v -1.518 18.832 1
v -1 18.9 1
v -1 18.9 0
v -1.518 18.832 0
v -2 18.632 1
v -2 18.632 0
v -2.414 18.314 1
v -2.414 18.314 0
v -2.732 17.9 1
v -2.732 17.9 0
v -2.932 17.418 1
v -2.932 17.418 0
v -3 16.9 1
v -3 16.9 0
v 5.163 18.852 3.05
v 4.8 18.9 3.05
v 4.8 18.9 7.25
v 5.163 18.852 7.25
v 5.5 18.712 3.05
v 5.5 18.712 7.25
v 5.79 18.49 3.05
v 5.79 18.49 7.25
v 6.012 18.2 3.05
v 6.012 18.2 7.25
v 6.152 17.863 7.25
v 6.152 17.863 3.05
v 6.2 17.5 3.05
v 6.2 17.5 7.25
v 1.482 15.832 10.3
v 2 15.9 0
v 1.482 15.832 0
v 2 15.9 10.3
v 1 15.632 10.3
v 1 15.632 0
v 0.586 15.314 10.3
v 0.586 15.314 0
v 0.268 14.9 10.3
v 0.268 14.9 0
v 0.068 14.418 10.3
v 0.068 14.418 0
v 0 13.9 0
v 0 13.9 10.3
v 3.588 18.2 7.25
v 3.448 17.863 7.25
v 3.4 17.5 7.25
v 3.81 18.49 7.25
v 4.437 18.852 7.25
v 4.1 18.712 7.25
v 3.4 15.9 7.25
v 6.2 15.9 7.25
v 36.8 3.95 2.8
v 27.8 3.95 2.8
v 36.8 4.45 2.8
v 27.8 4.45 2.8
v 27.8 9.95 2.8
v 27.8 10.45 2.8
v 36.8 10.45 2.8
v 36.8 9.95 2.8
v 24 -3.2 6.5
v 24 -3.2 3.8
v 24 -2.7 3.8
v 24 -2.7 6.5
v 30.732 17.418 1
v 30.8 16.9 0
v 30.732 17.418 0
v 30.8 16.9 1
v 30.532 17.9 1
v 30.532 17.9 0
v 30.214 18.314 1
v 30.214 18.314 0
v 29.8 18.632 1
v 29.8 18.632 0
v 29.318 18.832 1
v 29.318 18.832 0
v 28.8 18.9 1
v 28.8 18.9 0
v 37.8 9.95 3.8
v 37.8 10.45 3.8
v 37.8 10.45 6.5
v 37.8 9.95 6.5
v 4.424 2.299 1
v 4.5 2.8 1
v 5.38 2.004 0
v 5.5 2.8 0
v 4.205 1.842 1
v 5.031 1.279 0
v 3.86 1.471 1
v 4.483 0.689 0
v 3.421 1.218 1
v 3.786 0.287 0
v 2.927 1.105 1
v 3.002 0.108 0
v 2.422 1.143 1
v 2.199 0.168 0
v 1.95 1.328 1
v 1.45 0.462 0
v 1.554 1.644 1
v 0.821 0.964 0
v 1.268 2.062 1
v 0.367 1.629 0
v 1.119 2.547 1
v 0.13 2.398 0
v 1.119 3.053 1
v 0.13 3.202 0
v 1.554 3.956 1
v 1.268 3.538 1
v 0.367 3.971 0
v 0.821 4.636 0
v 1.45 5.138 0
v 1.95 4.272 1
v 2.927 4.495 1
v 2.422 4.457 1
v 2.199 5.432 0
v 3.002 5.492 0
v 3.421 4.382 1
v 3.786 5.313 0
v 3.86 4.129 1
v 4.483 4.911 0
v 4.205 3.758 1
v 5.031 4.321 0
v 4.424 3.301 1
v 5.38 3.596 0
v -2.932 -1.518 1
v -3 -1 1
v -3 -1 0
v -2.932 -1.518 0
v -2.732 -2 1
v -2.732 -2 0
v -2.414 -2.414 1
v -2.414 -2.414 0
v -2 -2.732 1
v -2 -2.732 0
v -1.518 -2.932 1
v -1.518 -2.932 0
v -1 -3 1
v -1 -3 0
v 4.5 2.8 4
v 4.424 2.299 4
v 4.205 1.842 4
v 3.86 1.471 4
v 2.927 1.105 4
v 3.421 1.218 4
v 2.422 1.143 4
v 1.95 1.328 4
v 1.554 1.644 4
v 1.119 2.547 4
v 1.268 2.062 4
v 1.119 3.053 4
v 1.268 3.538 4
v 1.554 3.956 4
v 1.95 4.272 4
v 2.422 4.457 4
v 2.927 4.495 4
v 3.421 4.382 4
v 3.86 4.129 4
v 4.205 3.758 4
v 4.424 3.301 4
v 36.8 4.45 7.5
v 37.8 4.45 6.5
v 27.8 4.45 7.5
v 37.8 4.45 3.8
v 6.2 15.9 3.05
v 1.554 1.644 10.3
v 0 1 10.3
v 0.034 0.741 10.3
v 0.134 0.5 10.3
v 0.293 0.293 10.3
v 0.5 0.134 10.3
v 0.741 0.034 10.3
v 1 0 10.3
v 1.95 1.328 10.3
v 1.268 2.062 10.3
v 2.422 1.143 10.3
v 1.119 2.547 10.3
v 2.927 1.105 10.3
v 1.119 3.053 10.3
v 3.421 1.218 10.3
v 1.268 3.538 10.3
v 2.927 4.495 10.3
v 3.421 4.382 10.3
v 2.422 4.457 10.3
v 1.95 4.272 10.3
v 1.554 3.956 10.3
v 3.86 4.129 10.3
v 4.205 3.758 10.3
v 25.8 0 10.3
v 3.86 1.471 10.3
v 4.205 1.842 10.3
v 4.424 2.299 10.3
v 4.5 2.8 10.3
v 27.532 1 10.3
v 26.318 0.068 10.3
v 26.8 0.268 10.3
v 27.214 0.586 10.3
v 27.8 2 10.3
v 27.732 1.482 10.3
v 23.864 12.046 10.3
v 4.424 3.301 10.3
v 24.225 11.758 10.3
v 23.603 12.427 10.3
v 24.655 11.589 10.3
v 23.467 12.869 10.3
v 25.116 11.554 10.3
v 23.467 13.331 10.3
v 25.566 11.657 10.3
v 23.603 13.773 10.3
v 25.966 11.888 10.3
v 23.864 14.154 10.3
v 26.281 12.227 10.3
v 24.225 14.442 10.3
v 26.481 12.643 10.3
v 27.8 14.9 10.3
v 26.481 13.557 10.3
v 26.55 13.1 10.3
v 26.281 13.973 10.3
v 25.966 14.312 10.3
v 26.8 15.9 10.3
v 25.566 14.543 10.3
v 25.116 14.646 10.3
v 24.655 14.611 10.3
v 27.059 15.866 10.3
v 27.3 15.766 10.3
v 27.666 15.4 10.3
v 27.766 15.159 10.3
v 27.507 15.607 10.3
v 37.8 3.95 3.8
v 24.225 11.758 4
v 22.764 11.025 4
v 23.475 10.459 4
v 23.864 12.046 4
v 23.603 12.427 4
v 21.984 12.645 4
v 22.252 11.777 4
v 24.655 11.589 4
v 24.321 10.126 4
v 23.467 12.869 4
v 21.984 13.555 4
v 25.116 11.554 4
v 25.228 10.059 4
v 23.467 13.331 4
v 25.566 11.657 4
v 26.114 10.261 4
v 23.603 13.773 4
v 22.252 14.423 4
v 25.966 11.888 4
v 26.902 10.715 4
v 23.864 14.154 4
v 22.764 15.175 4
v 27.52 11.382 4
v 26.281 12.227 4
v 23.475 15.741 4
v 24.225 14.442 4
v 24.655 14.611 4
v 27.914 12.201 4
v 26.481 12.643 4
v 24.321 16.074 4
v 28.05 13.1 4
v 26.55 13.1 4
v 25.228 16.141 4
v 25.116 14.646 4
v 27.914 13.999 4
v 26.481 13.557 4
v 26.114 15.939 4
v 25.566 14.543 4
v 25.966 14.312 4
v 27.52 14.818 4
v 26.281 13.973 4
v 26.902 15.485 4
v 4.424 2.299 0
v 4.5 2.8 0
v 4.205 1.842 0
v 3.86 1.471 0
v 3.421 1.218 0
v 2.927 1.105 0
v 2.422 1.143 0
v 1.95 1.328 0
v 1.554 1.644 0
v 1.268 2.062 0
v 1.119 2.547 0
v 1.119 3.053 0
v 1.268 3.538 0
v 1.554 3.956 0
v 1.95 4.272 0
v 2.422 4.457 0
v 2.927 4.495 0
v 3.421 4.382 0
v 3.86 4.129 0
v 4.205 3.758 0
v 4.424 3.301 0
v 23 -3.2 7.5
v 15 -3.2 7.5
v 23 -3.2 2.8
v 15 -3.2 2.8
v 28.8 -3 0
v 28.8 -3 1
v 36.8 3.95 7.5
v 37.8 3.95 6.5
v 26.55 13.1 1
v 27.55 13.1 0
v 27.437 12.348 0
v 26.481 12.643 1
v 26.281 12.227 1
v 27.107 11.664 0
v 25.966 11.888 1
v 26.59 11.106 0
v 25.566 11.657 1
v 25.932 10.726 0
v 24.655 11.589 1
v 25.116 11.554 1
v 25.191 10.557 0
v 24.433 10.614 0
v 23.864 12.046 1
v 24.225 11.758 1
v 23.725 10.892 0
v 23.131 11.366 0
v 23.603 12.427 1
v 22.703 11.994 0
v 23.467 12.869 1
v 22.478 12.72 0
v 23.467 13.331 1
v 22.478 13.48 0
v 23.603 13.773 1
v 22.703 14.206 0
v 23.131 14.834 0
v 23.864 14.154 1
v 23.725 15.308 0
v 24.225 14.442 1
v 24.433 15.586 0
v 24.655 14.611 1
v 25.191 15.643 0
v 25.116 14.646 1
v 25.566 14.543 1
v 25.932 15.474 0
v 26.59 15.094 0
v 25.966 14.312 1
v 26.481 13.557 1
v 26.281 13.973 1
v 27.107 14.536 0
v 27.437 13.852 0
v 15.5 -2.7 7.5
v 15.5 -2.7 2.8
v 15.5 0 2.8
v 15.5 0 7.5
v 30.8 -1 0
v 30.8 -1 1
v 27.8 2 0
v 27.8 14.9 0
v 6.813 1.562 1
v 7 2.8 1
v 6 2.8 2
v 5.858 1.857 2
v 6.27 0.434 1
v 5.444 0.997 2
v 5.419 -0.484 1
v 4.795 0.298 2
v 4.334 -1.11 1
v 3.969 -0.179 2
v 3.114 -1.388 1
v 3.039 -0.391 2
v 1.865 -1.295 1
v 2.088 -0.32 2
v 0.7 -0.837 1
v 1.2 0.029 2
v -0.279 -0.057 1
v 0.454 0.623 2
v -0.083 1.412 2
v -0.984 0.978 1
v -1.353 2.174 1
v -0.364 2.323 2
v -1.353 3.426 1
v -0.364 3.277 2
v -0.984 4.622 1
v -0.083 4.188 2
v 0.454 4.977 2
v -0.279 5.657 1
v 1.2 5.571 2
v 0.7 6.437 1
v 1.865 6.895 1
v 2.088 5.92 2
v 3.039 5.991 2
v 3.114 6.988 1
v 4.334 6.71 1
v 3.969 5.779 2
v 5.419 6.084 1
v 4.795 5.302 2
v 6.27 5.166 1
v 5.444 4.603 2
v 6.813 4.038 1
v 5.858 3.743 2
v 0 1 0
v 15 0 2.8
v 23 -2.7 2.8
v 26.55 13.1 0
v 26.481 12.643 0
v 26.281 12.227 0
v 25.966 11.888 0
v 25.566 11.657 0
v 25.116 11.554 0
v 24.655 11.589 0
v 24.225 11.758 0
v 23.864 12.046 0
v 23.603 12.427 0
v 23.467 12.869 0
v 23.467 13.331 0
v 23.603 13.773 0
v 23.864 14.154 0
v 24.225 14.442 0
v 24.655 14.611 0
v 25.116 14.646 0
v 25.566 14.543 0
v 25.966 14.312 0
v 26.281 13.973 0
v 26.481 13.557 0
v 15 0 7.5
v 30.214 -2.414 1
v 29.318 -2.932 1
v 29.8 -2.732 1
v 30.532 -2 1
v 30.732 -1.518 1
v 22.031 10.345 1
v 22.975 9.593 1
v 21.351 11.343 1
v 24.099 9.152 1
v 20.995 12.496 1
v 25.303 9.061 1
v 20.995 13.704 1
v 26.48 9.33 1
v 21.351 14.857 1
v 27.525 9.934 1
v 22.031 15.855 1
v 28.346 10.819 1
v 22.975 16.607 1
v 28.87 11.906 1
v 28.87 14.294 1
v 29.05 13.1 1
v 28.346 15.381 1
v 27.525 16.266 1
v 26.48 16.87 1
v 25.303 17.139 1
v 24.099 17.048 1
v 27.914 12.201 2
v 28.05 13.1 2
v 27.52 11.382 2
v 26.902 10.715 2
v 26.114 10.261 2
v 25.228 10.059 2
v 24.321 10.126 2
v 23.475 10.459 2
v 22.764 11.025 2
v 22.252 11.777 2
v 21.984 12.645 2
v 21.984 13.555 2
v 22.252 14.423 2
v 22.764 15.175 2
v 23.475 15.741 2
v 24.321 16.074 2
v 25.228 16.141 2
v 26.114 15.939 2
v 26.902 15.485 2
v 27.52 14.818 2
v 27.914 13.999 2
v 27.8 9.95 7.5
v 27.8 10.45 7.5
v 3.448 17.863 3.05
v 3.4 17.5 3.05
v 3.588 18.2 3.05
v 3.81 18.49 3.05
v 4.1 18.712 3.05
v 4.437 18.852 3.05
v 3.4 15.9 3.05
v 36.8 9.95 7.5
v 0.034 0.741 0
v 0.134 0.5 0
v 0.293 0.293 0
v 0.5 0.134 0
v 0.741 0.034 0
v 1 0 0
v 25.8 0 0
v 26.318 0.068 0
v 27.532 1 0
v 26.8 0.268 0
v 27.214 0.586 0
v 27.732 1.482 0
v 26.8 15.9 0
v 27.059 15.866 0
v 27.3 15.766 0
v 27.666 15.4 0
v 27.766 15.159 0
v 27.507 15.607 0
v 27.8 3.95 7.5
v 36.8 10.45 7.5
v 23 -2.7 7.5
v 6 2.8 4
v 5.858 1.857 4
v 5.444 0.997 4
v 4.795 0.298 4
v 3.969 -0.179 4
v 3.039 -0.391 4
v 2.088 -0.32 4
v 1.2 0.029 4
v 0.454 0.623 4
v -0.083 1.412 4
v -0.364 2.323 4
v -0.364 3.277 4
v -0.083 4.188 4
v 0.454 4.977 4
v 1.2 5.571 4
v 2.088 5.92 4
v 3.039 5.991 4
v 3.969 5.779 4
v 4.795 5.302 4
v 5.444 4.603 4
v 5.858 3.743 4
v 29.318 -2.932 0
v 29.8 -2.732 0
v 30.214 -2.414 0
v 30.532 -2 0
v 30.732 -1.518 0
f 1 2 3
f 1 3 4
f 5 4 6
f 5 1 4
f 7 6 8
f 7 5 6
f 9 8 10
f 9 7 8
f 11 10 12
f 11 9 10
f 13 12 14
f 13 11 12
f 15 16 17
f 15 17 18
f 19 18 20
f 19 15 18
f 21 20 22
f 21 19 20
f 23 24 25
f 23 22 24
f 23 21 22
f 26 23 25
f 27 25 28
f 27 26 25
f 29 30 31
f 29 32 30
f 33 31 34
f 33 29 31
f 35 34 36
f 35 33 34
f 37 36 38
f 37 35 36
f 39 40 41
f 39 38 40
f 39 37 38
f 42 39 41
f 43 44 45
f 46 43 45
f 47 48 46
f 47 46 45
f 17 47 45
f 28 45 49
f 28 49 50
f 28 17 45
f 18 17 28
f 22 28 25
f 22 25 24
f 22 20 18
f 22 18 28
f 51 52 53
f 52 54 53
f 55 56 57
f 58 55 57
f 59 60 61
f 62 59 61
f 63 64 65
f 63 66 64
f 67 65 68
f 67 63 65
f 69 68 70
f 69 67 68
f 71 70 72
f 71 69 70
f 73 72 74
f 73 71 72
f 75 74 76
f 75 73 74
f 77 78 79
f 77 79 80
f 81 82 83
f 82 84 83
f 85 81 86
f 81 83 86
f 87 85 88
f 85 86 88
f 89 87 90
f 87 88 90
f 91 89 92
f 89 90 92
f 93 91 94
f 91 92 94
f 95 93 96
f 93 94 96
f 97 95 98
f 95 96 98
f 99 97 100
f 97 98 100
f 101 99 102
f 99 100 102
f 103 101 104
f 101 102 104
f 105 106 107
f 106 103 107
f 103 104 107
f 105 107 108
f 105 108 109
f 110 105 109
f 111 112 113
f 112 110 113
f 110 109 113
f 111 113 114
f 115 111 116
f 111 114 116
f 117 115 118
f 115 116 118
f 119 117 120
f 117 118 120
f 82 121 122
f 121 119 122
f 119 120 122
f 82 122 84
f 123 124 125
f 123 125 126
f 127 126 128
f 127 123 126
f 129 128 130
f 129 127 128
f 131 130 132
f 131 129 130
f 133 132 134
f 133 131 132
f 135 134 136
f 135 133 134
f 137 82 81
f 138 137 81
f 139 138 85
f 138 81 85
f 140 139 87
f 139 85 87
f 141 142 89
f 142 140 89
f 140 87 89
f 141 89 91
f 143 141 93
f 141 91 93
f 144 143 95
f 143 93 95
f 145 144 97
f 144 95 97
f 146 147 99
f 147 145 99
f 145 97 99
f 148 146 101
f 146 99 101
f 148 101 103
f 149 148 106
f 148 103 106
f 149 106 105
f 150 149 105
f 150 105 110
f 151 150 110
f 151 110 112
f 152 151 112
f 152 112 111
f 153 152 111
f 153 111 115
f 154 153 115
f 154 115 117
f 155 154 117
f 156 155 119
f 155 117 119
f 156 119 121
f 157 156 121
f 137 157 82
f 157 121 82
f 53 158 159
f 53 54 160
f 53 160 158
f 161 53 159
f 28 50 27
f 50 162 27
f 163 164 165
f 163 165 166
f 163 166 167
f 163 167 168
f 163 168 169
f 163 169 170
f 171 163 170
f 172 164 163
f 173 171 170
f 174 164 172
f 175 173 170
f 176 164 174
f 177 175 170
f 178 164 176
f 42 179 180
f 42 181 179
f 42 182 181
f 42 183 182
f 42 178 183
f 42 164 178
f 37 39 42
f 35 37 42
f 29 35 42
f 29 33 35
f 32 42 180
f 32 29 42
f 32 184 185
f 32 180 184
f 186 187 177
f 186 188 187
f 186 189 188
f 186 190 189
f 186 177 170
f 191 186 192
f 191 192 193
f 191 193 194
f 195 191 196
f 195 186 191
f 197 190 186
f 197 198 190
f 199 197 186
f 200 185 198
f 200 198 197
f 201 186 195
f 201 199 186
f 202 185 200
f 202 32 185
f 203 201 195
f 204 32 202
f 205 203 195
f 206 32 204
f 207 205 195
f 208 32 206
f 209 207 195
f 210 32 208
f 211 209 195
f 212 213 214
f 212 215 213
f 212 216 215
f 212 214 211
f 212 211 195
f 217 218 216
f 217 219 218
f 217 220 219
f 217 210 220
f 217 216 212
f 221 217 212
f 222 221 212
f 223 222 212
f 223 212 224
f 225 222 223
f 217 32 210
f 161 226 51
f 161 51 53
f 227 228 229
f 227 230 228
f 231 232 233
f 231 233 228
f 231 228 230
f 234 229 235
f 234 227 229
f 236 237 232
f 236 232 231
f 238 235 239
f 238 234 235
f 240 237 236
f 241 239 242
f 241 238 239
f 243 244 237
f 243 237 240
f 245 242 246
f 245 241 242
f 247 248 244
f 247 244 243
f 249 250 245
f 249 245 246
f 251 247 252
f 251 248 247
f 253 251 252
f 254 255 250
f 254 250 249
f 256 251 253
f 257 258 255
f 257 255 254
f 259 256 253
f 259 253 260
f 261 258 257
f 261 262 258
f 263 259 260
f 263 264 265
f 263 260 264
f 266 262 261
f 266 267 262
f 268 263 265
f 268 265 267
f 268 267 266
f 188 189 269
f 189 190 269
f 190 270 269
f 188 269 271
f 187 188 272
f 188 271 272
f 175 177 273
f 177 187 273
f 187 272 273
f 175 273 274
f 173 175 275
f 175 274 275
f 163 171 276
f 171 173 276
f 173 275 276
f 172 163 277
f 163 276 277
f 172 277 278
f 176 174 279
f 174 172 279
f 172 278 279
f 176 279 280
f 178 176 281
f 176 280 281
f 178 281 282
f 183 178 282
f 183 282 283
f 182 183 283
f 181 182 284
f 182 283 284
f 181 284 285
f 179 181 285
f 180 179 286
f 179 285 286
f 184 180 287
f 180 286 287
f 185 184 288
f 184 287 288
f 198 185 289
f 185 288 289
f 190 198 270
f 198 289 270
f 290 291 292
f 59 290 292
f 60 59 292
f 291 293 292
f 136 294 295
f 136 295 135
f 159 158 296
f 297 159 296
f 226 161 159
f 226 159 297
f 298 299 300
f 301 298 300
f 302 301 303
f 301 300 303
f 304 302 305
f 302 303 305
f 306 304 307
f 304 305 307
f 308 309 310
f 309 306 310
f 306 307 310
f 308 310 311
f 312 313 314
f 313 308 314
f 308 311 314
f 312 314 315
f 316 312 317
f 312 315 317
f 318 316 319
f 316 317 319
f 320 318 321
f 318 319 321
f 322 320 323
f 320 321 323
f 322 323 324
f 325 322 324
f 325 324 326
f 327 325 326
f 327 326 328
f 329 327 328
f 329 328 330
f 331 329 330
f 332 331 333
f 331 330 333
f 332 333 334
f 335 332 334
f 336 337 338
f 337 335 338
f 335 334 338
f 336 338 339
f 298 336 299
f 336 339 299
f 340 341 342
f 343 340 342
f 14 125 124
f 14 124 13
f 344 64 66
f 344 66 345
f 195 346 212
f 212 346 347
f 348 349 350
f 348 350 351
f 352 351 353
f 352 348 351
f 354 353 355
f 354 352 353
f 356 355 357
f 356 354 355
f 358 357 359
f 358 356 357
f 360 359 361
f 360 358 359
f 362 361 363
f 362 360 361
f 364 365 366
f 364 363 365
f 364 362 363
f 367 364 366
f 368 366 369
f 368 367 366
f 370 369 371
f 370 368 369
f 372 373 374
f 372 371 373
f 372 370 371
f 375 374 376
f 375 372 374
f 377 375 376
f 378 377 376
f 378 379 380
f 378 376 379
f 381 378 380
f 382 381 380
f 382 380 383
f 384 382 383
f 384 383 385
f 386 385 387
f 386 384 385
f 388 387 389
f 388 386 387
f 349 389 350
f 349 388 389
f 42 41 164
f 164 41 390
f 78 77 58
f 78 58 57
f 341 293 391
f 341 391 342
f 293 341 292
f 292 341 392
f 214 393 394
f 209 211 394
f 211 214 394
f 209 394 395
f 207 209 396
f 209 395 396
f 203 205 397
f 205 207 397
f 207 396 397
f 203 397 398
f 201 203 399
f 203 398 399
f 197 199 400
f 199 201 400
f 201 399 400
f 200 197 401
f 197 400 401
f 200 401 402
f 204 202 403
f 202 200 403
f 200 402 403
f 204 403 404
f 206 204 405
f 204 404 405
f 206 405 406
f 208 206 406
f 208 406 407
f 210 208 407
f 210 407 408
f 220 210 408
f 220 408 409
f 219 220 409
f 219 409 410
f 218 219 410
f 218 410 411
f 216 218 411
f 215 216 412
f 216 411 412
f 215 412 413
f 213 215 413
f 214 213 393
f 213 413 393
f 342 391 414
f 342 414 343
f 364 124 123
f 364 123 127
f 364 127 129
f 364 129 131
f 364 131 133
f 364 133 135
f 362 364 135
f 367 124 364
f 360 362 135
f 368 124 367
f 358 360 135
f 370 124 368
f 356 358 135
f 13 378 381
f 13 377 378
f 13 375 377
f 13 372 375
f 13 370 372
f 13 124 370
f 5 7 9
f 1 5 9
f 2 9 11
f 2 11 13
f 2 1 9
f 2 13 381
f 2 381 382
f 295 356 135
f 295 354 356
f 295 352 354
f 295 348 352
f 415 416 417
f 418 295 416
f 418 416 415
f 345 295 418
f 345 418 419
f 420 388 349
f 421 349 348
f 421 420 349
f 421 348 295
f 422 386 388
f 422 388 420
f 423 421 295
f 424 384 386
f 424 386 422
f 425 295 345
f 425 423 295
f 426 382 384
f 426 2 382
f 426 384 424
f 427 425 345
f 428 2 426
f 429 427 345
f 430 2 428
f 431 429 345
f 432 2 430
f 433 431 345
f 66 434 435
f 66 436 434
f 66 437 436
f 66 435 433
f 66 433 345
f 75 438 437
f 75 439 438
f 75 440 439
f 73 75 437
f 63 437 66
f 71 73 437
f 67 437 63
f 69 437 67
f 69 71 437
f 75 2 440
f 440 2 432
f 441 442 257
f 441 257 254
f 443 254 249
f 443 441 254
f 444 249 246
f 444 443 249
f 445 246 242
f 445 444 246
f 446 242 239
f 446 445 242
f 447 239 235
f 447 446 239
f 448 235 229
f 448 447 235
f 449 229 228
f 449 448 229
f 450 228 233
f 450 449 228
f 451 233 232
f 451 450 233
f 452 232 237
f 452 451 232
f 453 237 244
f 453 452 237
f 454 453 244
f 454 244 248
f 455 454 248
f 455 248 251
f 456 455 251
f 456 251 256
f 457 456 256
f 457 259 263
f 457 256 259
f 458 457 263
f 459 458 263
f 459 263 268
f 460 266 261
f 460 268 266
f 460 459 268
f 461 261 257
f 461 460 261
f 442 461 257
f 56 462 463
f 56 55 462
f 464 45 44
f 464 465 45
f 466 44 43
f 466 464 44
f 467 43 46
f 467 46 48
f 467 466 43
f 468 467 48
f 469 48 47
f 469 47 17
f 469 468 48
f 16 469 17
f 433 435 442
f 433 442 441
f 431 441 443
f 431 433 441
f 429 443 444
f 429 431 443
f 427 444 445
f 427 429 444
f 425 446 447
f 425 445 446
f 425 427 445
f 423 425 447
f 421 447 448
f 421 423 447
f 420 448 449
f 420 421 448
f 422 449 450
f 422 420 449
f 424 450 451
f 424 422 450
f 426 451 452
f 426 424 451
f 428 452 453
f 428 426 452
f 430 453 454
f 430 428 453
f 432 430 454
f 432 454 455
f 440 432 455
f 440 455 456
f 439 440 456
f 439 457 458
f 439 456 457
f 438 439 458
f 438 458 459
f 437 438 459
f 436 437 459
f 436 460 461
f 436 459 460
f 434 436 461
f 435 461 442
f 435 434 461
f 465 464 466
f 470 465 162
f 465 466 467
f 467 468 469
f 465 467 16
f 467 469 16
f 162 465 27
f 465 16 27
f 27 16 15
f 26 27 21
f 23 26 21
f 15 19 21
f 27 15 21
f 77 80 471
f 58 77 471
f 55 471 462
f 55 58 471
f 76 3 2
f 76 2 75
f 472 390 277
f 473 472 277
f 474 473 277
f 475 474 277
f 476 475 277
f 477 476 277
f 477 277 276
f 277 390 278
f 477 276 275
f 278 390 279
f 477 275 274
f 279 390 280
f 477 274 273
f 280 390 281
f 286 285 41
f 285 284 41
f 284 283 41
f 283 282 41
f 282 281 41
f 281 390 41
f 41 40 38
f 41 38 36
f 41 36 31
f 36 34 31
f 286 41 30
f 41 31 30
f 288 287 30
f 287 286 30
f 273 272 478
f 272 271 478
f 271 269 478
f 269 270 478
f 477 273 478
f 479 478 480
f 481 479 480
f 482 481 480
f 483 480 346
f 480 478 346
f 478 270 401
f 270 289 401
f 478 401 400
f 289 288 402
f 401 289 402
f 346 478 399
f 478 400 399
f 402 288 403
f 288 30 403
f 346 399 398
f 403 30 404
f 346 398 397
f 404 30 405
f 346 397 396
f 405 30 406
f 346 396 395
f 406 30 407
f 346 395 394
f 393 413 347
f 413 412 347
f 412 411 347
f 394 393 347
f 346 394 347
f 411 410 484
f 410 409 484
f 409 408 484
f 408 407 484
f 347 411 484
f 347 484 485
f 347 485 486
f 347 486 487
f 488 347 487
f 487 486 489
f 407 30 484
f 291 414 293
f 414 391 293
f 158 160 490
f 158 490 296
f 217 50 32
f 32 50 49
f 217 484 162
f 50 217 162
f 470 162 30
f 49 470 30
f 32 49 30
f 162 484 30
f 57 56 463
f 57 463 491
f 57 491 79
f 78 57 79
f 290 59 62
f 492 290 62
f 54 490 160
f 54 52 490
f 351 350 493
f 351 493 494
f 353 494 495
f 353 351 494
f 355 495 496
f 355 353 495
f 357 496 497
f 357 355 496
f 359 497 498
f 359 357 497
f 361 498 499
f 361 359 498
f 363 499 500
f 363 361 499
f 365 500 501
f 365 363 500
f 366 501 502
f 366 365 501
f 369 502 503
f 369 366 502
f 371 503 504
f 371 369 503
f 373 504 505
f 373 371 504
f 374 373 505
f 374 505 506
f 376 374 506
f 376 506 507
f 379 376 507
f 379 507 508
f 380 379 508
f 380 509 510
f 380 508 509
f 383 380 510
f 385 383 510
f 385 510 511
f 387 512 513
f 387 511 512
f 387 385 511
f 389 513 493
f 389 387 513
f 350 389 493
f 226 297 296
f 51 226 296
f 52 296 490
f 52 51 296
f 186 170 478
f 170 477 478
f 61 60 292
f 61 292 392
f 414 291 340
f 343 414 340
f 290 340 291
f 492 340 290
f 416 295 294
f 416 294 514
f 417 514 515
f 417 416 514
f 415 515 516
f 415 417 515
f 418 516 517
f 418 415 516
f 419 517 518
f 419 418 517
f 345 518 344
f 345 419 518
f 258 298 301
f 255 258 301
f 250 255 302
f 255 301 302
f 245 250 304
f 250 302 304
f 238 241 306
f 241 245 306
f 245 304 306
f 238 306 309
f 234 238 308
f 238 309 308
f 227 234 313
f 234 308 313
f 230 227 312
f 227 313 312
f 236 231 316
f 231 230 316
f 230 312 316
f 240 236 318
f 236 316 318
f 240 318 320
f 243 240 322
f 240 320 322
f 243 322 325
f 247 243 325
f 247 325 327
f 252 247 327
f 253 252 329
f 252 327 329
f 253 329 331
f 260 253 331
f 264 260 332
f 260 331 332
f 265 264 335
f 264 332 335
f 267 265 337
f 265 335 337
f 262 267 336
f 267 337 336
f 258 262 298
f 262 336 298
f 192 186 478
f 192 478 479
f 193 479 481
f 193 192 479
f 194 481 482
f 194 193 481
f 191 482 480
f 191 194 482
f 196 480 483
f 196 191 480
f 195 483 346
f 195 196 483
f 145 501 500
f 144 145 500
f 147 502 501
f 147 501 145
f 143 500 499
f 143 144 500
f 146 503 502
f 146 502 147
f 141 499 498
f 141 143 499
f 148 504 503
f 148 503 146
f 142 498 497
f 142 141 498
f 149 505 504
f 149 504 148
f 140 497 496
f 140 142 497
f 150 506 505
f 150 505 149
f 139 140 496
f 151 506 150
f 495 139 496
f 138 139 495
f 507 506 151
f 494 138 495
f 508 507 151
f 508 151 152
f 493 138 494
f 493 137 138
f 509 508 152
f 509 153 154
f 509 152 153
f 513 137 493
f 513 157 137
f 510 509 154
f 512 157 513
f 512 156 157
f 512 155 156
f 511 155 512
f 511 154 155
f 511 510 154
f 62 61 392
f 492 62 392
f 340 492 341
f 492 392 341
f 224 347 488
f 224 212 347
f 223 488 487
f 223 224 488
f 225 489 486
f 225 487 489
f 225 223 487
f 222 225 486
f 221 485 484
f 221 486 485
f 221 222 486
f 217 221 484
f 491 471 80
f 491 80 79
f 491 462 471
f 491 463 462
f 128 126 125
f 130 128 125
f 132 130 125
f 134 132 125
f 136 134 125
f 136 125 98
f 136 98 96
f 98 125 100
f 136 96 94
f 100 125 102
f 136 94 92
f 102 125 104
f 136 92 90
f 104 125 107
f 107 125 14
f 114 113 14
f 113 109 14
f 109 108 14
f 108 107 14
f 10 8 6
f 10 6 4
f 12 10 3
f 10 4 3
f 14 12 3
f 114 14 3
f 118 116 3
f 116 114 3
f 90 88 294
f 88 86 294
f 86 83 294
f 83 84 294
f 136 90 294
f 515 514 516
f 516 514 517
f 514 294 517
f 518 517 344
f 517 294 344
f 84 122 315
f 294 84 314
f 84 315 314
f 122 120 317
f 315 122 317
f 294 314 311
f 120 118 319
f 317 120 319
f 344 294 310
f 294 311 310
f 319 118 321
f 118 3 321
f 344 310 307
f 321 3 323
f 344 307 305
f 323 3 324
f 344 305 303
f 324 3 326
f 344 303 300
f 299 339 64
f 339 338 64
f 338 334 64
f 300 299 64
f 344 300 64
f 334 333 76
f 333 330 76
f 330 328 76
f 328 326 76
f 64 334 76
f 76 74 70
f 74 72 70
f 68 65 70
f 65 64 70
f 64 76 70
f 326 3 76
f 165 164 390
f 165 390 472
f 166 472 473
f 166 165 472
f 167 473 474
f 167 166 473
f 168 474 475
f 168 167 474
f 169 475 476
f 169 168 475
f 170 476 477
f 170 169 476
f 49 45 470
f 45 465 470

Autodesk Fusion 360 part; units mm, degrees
sketch "Sketch1" plane through (0, 0, 0) normal (0, 0, 1) x (1, 0, 0)
  line L0 (0, 0) -> (27.8, 0)
  line L1 (27.8, 0) -> (27.8, 15.9)
  line L2 (27.8, 15.9) -> (0, 15.9)
  line L3 (0, 15.9) -> (0, 0)
  circle A0 centre (2.8, 2.8) radius 1.7
  circle A1 centre (25, 13.1) radius 1.55
  line L4 (3.4, 15.9) -> (6.2, 15.9)
  line L5 (6.2, 15.9) -> (6.2, 18.9)
  line L6 (6.2, 18.9) -> (3.4, 18.9)
  line L7 (3.4, 18.9) -> (3.4, 15.9)
  line L8 (4.8, 18.9) -> (4.8, 15.9) construction
  line L9 (15, 0) -> (15, -3.2)
  line L10 (15, -3.2) -> (24, -3.2)
  line L11 (24, -3.2) -> (24, -2.7)
  line L12 (24, -2.7) -> (15.5, -2.7)
  line L13 (15.5, -2.7) -> (15.5, 0)
  line L14 (27.8, 10.45) -> (37.8, 10.45)
  line L15 (37.8, 10.45) -> (37.8, 9.95)
  line L16 (37.8, 9.95) -> (27.8, 9.95)
  line L17 (27.8, 9.95) -> (27.8, 10.45)
  line L18 (27.8, 4.45) -> (37.8, 4.45)
  line L19 (37.8, 4.45) -> (37.8, 3.95)
  line L20 (37.8, 3.95) -> (27.8, 3.95)
  line L21 (27.8, 3.95) -> (27.8, 4.45)
  dimension "d1" = 27.8
  dimension "d2" = 15.9
  dimension "d3" = 3.4
  dimension "d4" = 2.8
  dimension "d5" = 2.8
  dimension "d6" = 3.1
  dimension "d7" = 22.2
  dimension "d8" = 10.3
  dimension "d13" = 2.8
  dimension "d14" = 20.2
  dimension "d15" = 3
  dimension "d20" = 0.5
  dimension "d21" = 0.5
  dimension "d22" = 12.2
  dimension "d23" = 10
  dimension "d24" = 0.5
  dimension "d25" = 2.7
  dimension "d26" = 10
  dimension "d27" = 0.5
  dimension "d28" = 5.5
  dimension "d30" = 7.15
  dimension "d34" = 9
extrude "Extrude1" add sketch "Sketch1" along normal blind 10.3 contours L0 L1 L2 L3 L4 L17 L21 makes body 1
fillet "Fillet1" radius 1 2 edges at (0, 0, 5.15) (27.8, 15.9, 5.15) on bodies 1
fillet "Fillet2" radius 2 2 edges at (27.8, 0, 5.15) (0, 15.9, 5.15) on bodies 1
ref_plane "WorkPlane1" through (13.9, 7.95, 5.15) normal (0, 0, 1) x (1, 0, 0)
extrude "Extrude2" add sketch "Sketch1" along normal mid plane 4.2 from surface at 5.15 contours L2 L4 L5 L6 L7 bodies 1
fillet "Fillet3" radius 1.4 2 edges at (3.4, 18.9, 5.15) (6.2, 18.9, 5.15) on bodies 1
extrude "Extrude3" add sketch "Sketch1" along normal mid plane 4.7 from surface at 5.15 separate body contours L0 L9 L10 L11 L12 L13 | L1 L18 L19 L20 L21 | L1 L14 L15 L16 L17 makes body 2 at (21, -3.2, 5.9333) makes body 3 at (34.4667, 3.95, 4.3667) makes body 4 at (31.1333, 10.45, 4.3667)
chamfer "Chamfer1" distance 1 angle 45 6 edges at (24, -2.95, 7.5) (24, -2.95, 2.8) (37.8, 10.2, 7.5) (37.8, 4.2, 7.5) (37.8, 10.2, 2.8) (37.8, 4.2, 2.8) on bodies 2 3 4
sketch "Sketch3" plane through (0, 0, 0) normal (0, 0, 1) x (1, 0, 0) in component "Component"
  line L0 (-3, 18.9) -> (30.8, 18.9)
  line L1 (30.8, 18.9) -> (30.8, -3)
  line L2 (30.8, -3) -> (-3, -3)
  line L3 (-3, -3) -> (-3, 18.9)
  line L4 (27.8, 2) -> (27.8, 14.9) construction
  line L5 (0, 13.9) -> (0, 1) construction
  line L6 (1, 0) -> (25.8, 0) construction
  line L7 (26.8, 15.9) -> (2, 15.9) construction
  circle A0 centre (25, 13.1) radius 1.55
  circle A1 centre (2.8, 2.8) radius 1.7
  circle A2 centre (2.8, 2.8) radius 3.2
  circle A3 centre (25, 13.1) radius 3.05
  dimension "d36" = 3
  dimension "d37" = 3
  dimension "d38" = 3
  dimension "d39" = 3
  dimension "d42" = 1.5
  dimension "d43" = 1.5
extrude "Extrude1'" add sketch "Sketch3" along normal blind 1 separate body contours L0 L1 L2 L3 | A2 | A3 makes body 5 in component "Component"
extrude "Extrude2'" add sketch "Sketch3" along normal blind 3 from surface at 1 contours A2 | A3 bodies 5 in component "Component"
chamfer "Chamfer1'" distance 1 angle 45 4 edges at (1.215, 3.4147, 0) (23.5549, 13.6605, 0) (-0.1834, 3.9572, 1) (22.1564, 14.2029, 1) on bodies 5 in component "Component"
fillet "Fillet1'" radius 2 4 edges at (-3, -3, 0.5) (-3, 18.9, 0.5) (30.8, 18.9, 0.5) (30.8, -3, 0.5) on bodies 5 in component "Component"
component "Component" placed x (1, 0, 0) y (0, 1, 0) z (0, 0, 1) at (0, 0, 0)
equation "d17 = ( 4.2 / 2 ) * 1 mm"
equation "d32 = ( 4.7 / 2 ) * 1 mm"
